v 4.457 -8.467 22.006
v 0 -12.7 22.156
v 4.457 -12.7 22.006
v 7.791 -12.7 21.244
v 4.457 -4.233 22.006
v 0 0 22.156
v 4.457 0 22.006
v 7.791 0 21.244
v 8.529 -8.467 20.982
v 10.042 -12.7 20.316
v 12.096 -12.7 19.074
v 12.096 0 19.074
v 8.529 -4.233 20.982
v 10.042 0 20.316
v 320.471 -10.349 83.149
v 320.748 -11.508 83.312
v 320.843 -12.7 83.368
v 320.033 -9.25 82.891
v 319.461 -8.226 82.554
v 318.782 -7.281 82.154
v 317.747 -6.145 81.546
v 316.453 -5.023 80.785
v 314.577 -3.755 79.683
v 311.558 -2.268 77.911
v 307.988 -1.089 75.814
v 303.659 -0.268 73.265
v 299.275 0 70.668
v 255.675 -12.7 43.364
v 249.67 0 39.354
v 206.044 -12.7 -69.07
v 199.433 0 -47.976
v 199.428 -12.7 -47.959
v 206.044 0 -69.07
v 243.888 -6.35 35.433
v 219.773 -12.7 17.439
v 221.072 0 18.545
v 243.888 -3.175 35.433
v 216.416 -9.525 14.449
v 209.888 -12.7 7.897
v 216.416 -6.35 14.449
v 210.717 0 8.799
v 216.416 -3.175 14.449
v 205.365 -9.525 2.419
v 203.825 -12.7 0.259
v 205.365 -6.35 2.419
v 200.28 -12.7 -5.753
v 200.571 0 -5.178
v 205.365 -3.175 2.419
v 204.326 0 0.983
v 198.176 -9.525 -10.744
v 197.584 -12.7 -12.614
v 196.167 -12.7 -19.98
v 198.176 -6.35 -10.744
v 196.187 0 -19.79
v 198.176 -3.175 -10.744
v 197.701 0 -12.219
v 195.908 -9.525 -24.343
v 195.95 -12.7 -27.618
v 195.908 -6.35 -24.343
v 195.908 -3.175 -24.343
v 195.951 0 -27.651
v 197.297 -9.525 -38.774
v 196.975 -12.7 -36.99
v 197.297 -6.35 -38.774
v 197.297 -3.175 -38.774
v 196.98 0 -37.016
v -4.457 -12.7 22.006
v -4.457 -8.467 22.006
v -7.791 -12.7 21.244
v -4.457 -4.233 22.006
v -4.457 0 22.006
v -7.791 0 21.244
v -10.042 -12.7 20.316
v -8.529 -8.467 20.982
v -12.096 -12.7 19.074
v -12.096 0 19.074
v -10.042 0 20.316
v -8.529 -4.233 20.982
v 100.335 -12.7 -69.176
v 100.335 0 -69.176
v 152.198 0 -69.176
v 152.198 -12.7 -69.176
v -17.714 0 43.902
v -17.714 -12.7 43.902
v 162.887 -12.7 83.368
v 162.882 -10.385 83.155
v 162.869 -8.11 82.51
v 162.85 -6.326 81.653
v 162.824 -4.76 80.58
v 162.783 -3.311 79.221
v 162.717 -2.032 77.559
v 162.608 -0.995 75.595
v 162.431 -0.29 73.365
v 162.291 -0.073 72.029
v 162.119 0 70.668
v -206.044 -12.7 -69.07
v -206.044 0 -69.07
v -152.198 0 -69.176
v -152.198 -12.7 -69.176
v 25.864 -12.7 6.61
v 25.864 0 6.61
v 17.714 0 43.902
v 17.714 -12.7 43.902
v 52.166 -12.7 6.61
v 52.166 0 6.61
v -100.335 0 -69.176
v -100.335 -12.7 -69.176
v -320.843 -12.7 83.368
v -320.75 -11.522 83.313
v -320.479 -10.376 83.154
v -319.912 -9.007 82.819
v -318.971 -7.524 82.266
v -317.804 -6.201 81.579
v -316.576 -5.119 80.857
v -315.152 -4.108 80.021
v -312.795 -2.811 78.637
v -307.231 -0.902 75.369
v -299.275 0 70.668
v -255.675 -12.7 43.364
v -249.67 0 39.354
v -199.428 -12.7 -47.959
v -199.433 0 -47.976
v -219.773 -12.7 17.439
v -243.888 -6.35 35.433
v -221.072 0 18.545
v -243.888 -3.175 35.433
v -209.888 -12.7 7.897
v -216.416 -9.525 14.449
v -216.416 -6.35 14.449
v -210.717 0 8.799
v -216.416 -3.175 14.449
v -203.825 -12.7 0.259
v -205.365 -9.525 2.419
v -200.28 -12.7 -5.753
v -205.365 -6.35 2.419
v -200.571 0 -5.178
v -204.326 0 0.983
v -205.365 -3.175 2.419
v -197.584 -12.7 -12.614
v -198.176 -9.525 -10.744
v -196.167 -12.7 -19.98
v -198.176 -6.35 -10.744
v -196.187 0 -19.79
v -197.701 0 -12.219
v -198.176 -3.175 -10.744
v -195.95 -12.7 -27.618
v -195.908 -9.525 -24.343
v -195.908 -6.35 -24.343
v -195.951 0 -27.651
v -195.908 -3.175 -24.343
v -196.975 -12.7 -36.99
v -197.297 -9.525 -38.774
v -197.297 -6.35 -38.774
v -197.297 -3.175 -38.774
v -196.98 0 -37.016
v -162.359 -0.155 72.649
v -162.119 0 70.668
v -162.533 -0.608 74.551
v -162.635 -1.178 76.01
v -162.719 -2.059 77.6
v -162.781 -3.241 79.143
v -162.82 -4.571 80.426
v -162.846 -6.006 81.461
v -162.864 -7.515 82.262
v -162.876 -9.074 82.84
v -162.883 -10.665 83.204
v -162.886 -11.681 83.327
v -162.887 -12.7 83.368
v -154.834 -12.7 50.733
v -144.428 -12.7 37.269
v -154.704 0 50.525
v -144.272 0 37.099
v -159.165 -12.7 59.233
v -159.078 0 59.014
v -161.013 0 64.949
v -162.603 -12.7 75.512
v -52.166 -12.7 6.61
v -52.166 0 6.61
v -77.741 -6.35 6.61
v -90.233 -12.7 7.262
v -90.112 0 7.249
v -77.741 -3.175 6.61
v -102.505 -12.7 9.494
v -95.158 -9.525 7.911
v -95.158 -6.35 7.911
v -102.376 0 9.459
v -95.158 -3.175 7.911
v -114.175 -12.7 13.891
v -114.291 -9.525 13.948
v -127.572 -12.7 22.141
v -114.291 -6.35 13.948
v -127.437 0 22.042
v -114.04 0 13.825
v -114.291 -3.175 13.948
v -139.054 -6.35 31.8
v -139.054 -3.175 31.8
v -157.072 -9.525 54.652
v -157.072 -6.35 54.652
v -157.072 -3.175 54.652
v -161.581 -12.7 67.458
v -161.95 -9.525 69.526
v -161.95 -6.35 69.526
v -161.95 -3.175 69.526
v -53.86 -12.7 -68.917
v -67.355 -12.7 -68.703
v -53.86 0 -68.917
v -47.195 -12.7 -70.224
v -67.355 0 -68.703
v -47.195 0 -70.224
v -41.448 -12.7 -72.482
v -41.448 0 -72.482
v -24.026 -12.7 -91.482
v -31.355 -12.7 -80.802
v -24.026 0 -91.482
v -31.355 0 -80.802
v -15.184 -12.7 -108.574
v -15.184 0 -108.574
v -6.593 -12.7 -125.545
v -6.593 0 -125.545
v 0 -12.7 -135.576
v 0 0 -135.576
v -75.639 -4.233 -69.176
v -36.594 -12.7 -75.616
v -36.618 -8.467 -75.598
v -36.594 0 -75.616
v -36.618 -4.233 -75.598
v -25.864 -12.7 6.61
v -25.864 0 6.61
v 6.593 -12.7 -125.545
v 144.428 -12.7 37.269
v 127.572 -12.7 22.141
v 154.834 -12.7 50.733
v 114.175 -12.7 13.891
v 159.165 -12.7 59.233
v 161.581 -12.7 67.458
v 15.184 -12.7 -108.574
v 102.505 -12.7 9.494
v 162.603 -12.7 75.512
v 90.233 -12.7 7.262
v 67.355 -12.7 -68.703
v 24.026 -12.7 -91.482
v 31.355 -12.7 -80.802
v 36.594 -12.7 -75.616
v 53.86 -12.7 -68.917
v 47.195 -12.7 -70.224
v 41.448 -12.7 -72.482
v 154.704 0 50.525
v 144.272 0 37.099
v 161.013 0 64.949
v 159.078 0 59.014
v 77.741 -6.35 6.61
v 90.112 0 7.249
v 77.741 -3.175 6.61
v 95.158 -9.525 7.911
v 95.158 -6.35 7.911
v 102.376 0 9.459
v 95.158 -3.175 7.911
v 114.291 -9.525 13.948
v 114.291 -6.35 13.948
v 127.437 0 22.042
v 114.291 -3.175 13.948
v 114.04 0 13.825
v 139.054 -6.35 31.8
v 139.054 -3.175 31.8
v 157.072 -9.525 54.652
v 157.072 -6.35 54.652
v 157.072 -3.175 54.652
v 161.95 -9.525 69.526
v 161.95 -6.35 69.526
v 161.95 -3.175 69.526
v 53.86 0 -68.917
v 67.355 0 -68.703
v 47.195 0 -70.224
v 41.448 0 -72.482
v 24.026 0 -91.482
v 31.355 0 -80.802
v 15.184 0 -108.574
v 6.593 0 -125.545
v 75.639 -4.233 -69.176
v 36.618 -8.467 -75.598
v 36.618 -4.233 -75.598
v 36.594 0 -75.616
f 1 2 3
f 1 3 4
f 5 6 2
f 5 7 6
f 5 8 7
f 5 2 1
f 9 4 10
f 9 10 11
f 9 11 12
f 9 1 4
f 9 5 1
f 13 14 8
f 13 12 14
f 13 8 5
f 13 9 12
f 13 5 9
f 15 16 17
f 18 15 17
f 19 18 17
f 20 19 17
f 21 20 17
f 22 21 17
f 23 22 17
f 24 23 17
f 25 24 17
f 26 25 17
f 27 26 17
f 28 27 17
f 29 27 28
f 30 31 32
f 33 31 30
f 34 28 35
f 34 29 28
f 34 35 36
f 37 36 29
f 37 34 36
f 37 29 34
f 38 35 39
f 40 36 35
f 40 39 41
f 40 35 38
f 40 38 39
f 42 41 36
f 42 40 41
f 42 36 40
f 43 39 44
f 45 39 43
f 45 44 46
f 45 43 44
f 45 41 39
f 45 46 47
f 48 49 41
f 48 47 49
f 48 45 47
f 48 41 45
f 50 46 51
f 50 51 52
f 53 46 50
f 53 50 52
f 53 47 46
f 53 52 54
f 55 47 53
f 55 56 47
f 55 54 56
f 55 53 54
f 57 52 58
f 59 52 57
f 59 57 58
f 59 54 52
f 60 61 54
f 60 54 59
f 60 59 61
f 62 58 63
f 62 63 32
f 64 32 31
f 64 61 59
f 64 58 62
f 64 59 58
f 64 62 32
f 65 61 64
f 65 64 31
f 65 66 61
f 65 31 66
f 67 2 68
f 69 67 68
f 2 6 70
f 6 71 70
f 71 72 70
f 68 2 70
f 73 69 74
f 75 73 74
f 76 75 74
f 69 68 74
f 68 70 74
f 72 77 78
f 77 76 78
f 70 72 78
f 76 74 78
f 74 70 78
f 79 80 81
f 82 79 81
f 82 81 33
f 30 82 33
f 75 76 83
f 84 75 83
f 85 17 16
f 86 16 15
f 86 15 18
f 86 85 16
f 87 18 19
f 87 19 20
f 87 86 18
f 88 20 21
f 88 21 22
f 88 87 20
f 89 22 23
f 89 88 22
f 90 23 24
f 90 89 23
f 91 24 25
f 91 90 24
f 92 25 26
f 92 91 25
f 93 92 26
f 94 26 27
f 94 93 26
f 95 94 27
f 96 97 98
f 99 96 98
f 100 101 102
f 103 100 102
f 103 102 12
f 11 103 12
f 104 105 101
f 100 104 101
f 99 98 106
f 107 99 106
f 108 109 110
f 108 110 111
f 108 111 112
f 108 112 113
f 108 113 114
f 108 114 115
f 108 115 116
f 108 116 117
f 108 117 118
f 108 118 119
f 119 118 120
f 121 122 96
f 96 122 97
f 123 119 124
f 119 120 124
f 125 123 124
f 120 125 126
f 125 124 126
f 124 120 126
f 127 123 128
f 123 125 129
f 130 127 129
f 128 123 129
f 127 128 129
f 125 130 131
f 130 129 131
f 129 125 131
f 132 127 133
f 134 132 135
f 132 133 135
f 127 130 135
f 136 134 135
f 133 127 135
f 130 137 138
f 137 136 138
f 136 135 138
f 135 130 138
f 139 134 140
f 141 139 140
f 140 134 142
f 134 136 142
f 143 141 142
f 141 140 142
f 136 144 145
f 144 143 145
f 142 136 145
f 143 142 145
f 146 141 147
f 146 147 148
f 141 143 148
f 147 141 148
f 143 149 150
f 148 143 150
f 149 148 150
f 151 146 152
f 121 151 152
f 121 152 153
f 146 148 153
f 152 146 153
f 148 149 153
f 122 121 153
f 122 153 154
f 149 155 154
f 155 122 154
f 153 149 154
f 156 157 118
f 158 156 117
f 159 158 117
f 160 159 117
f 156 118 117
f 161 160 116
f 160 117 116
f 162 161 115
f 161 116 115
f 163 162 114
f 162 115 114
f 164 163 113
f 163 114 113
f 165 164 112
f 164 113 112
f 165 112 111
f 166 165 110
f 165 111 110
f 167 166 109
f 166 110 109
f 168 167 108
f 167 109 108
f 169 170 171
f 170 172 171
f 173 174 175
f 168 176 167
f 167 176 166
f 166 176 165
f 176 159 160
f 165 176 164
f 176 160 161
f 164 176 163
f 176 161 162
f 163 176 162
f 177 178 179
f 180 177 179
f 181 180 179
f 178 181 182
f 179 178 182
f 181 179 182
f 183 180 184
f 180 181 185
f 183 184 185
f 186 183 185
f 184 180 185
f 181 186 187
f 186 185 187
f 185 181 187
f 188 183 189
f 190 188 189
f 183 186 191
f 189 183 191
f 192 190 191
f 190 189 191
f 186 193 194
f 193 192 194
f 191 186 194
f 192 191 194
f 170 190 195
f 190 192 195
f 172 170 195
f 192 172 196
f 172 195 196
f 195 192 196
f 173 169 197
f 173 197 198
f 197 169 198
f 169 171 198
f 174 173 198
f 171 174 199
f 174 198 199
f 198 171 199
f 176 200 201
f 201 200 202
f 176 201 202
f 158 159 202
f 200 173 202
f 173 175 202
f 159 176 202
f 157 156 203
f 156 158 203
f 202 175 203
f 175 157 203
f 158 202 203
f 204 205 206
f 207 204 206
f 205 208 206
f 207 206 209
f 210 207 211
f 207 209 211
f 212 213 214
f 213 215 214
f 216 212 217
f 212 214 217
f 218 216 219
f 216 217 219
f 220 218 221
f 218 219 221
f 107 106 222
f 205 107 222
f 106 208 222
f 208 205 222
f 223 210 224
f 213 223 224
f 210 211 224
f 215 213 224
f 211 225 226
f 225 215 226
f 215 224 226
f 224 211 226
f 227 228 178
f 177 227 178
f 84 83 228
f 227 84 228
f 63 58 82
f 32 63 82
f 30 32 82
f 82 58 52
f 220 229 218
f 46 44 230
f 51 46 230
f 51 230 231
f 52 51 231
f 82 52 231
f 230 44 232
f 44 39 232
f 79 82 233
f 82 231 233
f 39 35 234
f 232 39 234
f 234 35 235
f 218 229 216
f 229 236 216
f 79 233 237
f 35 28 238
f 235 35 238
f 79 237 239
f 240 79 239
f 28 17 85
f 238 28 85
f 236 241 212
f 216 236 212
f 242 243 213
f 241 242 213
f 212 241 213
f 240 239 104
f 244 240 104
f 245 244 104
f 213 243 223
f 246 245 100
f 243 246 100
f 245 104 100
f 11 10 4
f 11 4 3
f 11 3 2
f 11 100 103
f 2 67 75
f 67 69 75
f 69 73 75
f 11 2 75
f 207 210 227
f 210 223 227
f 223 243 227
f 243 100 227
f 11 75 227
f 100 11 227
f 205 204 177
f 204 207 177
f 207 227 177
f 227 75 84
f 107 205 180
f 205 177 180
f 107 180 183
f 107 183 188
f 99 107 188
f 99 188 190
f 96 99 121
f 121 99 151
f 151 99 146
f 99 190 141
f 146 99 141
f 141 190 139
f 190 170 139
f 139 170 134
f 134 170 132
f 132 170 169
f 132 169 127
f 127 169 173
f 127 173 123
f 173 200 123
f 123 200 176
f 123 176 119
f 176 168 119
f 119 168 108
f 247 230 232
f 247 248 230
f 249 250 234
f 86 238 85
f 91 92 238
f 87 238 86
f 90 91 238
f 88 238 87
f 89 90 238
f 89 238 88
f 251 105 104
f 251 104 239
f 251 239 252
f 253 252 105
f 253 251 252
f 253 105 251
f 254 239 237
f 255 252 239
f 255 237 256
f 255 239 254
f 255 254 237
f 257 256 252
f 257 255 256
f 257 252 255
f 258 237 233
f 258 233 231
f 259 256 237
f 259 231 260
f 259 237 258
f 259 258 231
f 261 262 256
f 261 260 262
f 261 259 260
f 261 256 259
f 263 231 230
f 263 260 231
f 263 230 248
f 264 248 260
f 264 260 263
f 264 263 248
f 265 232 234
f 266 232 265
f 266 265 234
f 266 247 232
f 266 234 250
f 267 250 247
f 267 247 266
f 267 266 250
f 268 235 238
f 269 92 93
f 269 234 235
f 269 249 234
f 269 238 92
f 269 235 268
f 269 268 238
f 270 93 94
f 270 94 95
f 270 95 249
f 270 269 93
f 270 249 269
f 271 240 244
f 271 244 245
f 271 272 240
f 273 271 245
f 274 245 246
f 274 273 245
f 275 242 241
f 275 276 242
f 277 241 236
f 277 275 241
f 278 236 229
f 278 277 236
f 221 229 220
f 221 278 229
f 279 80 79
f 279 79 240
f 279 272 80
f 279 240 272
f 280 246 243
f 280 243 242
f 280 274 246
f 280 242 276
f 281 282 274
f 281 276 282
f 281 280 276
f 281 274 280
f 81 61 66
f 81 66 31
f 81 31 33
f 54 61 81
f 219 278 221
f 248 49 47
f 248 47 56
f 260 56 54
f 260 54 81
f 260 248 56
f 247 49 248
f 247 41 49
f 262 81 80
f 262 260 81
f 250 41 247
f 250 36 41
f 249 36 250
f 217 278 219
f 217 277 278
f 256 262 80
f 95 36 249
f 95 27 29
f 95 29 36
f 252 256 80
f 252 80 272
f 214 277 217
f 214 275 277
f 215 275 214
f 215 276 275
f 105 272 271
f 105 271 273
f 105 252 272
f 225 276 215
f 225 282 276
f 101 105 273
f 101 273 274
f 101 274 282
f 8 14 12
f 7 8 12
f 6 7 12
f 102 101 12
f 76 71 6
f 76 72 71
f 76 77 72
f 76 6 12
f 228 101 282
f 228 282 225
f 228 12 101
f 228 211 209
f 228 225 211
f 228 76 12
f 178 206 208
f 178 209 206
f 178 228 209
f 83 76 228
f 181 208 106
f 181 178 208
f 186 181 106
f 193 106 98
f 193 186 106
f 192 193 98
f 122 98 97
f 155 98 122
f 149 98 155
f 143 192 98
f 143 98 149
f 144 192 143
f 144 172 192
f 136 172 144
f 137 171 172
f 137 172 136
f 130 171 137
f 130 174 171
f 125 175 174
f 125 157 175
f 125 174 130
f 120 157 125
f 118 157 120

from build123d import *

# Parameters (mm, degrees)
F1_DEPTH = 12.7
F2_R     = 12.69999
F3_R     = 12.69999


# Not quite as in the source:
# - a fillet or chamfer is up to 0.001 mm smaller than in the source, because OpenCascade refuses the exact size


with BuildPart() as f1:
    # F0 (on Front) → F1 (new body)
    with BuildSketch(Plane.XZ):
        with BuildLine():
            add(Edge.make_bspline(
                [(0, 22.1556201577), (4.6081906185, 22.4393960088), (8.8232094422, 21.4276518673), (12.0959098929, 19.0737502837)],
                knots=[0, 0, 0, 0, 12.4823458556, 12.4823458556, 12.4823458556, 12.4823458556], degree=3))
            add(Edge.make_bspline(
                [(0, 22.1556201577), (-4.6081906185, 22.4393960088), (-8.8232094422, 21.4276518673), (-12.0959098929, 19.0737502837)],
                knots=[0, 0, 0, 0, 12.4823458556, 12.4823458556, 12.4823458556, 12.4823458556], degree=3))
            Line((-12.0959098929, 19.0737502837), (-17.7139695734, 43.9015217125))
            Line((-17.7139695734, 43.9015217125), (-25.8638337255, 6.609717384))
            Line((-25.8638337255, 6.609717384), (-52.1656684577, 6.609717384))
            add(Edge.make_bspline(
                [(-52.1656684577, 6.609717384), (-60.3978514517, 6.5219254793), (-78.5756597545, 6.3269402408), (-116.4466347426, 8.1732890136), (-162.2561628931, 52.1737802861), (-162.6985337077, 74.2627820904), (-162.8867536783, 83.3681735719)],
                knots=[0, 0, 0, 0, 0.2084568336, 0.4601327492, 0.7768832352, 1, 1, 1, 1], degree=3))
            Line((-162.8867536783, 83.3681735719), (-320.8426764241, 83.3681735719))
            add(Edge.make_bspline(
                [(-320.8426764241, 83.3681735719), (-310.9533159528, 77.5358259805), (-288.6959219459, 64.6452840474), (-244.3194495003, 36.5716752771), (-184.7380258313, -6.777248073), (-199.2239955574, -48.5914785577), (-206.0440058214, -69.0696899563)],
                knots=[0, 0, 0, 0, 0.2057375573, 0.4598387655, 0.7366005134, 1, 1, 1, 1], degree=3))
            Line((-206.0440058214, -69.0696899563), (-152.1980017424, -69.1764205694))
            Line((-152.1980017424, -69.1764205694), (-100.3352329135, -69.1764205694))
            add(Edge.make_bspline(
                [(-100.3352329135, -69.1764205694), (-93.1837151487, -69.1338341935), (-75.4005733711, -70.292076661), (-27.8541687884, -63.5387172898), (-12.4442655786, -120.211944878), (0, -135.5760842562)],
                knots=[0, 0, 0, 0, 0.2530200956, 0.5731929838, 1, 1, 1, 1], degree=3))
            add(Edge.make_bspline(
                [(100.3352329135, -69.1764205694), (93.1837151487, -69.1338341935), (75.4005733711, -70.292076661), (27.8541687884, -63.5387172898), (12.4442655786, -120.211944878), (0, -135.5760842562)],
                knots=[0, 0, 0, 0, 0.2530200956, 0.5731929838, 1, 1, 1, 1], degree=3))
            Line((100.3352329135, -69.1764205694), (152.1980017424, -69.1764205694))
            Line((152.1980017424, -69.1764205694), (206.0440058214, -69.0696899563))
            add(Edge.make_bspline(
                [(320.8426764241, 83.3681735719), (310.9533159528, 77.5358259805), (288.6959219459, 64.6452840474), (244.3194495003, 36.5716752771), (184.7380258313, -6.777248073), (199.2239955574, -48.5914785577), (206.0440058214, -69.0696899563)],
                knots=[0, 0, 0, 0, 0.2057375573, 0.4598387655, 0.7366005134, 1, 1, 1, 1], degree=3))
            Line((320.8426764241, 83.3681735719), (162.8867536783, 83.3681735719))
            add(Edge.make_bspline(
                [(52.1656684577, 6.609717384), (60.3978514517, 6.5219254793), (78.5756597545, 6.3269402408), (116.4466347426, 8.1732890136), (162.2561628931, 52.1737802861), (162.6985337077, 74.2627820904), (162.8867536783, 83.3681735719)],
                knots=[0, 0, 0, 0, 0.2084568336, 0.4601327492, 0.7768832352, 1, 1, 1, 1], degree=3))
            Line((52.1656684577, 6.609717384), (25.8638337255, 6.609717384))
            Line((25.8638337255, 6.609717384), (17.7139695734, 43.9015217125))
            Line((17.7139695734, 43.9015217125), (12.0959098929, 19.0737502837))
        make_face()
    extrude(amount=F1_DEPTH)

    # F2 (radius 12.7 in the source; OpenCascade refuses exactly that, so slightly less here)
    f2_edges = [f1.edges().sort_by_distance(p)[0] for p in [
        (241.864715, 0, 83.368174),
    ]]
    fillet(f2_edges, radius=F2_R)

    # F3 (radius 12.7 in the source; OpenCascade refuses exactly that, so slightly less here)
    f3_edges = [f1.edges().sort_by_distance(p)[0] for p in [
        (-241.864715, 0, 83.368174),
    ]]
    fillet(f3_edges, radius=F3_R)


solid = f1.part
